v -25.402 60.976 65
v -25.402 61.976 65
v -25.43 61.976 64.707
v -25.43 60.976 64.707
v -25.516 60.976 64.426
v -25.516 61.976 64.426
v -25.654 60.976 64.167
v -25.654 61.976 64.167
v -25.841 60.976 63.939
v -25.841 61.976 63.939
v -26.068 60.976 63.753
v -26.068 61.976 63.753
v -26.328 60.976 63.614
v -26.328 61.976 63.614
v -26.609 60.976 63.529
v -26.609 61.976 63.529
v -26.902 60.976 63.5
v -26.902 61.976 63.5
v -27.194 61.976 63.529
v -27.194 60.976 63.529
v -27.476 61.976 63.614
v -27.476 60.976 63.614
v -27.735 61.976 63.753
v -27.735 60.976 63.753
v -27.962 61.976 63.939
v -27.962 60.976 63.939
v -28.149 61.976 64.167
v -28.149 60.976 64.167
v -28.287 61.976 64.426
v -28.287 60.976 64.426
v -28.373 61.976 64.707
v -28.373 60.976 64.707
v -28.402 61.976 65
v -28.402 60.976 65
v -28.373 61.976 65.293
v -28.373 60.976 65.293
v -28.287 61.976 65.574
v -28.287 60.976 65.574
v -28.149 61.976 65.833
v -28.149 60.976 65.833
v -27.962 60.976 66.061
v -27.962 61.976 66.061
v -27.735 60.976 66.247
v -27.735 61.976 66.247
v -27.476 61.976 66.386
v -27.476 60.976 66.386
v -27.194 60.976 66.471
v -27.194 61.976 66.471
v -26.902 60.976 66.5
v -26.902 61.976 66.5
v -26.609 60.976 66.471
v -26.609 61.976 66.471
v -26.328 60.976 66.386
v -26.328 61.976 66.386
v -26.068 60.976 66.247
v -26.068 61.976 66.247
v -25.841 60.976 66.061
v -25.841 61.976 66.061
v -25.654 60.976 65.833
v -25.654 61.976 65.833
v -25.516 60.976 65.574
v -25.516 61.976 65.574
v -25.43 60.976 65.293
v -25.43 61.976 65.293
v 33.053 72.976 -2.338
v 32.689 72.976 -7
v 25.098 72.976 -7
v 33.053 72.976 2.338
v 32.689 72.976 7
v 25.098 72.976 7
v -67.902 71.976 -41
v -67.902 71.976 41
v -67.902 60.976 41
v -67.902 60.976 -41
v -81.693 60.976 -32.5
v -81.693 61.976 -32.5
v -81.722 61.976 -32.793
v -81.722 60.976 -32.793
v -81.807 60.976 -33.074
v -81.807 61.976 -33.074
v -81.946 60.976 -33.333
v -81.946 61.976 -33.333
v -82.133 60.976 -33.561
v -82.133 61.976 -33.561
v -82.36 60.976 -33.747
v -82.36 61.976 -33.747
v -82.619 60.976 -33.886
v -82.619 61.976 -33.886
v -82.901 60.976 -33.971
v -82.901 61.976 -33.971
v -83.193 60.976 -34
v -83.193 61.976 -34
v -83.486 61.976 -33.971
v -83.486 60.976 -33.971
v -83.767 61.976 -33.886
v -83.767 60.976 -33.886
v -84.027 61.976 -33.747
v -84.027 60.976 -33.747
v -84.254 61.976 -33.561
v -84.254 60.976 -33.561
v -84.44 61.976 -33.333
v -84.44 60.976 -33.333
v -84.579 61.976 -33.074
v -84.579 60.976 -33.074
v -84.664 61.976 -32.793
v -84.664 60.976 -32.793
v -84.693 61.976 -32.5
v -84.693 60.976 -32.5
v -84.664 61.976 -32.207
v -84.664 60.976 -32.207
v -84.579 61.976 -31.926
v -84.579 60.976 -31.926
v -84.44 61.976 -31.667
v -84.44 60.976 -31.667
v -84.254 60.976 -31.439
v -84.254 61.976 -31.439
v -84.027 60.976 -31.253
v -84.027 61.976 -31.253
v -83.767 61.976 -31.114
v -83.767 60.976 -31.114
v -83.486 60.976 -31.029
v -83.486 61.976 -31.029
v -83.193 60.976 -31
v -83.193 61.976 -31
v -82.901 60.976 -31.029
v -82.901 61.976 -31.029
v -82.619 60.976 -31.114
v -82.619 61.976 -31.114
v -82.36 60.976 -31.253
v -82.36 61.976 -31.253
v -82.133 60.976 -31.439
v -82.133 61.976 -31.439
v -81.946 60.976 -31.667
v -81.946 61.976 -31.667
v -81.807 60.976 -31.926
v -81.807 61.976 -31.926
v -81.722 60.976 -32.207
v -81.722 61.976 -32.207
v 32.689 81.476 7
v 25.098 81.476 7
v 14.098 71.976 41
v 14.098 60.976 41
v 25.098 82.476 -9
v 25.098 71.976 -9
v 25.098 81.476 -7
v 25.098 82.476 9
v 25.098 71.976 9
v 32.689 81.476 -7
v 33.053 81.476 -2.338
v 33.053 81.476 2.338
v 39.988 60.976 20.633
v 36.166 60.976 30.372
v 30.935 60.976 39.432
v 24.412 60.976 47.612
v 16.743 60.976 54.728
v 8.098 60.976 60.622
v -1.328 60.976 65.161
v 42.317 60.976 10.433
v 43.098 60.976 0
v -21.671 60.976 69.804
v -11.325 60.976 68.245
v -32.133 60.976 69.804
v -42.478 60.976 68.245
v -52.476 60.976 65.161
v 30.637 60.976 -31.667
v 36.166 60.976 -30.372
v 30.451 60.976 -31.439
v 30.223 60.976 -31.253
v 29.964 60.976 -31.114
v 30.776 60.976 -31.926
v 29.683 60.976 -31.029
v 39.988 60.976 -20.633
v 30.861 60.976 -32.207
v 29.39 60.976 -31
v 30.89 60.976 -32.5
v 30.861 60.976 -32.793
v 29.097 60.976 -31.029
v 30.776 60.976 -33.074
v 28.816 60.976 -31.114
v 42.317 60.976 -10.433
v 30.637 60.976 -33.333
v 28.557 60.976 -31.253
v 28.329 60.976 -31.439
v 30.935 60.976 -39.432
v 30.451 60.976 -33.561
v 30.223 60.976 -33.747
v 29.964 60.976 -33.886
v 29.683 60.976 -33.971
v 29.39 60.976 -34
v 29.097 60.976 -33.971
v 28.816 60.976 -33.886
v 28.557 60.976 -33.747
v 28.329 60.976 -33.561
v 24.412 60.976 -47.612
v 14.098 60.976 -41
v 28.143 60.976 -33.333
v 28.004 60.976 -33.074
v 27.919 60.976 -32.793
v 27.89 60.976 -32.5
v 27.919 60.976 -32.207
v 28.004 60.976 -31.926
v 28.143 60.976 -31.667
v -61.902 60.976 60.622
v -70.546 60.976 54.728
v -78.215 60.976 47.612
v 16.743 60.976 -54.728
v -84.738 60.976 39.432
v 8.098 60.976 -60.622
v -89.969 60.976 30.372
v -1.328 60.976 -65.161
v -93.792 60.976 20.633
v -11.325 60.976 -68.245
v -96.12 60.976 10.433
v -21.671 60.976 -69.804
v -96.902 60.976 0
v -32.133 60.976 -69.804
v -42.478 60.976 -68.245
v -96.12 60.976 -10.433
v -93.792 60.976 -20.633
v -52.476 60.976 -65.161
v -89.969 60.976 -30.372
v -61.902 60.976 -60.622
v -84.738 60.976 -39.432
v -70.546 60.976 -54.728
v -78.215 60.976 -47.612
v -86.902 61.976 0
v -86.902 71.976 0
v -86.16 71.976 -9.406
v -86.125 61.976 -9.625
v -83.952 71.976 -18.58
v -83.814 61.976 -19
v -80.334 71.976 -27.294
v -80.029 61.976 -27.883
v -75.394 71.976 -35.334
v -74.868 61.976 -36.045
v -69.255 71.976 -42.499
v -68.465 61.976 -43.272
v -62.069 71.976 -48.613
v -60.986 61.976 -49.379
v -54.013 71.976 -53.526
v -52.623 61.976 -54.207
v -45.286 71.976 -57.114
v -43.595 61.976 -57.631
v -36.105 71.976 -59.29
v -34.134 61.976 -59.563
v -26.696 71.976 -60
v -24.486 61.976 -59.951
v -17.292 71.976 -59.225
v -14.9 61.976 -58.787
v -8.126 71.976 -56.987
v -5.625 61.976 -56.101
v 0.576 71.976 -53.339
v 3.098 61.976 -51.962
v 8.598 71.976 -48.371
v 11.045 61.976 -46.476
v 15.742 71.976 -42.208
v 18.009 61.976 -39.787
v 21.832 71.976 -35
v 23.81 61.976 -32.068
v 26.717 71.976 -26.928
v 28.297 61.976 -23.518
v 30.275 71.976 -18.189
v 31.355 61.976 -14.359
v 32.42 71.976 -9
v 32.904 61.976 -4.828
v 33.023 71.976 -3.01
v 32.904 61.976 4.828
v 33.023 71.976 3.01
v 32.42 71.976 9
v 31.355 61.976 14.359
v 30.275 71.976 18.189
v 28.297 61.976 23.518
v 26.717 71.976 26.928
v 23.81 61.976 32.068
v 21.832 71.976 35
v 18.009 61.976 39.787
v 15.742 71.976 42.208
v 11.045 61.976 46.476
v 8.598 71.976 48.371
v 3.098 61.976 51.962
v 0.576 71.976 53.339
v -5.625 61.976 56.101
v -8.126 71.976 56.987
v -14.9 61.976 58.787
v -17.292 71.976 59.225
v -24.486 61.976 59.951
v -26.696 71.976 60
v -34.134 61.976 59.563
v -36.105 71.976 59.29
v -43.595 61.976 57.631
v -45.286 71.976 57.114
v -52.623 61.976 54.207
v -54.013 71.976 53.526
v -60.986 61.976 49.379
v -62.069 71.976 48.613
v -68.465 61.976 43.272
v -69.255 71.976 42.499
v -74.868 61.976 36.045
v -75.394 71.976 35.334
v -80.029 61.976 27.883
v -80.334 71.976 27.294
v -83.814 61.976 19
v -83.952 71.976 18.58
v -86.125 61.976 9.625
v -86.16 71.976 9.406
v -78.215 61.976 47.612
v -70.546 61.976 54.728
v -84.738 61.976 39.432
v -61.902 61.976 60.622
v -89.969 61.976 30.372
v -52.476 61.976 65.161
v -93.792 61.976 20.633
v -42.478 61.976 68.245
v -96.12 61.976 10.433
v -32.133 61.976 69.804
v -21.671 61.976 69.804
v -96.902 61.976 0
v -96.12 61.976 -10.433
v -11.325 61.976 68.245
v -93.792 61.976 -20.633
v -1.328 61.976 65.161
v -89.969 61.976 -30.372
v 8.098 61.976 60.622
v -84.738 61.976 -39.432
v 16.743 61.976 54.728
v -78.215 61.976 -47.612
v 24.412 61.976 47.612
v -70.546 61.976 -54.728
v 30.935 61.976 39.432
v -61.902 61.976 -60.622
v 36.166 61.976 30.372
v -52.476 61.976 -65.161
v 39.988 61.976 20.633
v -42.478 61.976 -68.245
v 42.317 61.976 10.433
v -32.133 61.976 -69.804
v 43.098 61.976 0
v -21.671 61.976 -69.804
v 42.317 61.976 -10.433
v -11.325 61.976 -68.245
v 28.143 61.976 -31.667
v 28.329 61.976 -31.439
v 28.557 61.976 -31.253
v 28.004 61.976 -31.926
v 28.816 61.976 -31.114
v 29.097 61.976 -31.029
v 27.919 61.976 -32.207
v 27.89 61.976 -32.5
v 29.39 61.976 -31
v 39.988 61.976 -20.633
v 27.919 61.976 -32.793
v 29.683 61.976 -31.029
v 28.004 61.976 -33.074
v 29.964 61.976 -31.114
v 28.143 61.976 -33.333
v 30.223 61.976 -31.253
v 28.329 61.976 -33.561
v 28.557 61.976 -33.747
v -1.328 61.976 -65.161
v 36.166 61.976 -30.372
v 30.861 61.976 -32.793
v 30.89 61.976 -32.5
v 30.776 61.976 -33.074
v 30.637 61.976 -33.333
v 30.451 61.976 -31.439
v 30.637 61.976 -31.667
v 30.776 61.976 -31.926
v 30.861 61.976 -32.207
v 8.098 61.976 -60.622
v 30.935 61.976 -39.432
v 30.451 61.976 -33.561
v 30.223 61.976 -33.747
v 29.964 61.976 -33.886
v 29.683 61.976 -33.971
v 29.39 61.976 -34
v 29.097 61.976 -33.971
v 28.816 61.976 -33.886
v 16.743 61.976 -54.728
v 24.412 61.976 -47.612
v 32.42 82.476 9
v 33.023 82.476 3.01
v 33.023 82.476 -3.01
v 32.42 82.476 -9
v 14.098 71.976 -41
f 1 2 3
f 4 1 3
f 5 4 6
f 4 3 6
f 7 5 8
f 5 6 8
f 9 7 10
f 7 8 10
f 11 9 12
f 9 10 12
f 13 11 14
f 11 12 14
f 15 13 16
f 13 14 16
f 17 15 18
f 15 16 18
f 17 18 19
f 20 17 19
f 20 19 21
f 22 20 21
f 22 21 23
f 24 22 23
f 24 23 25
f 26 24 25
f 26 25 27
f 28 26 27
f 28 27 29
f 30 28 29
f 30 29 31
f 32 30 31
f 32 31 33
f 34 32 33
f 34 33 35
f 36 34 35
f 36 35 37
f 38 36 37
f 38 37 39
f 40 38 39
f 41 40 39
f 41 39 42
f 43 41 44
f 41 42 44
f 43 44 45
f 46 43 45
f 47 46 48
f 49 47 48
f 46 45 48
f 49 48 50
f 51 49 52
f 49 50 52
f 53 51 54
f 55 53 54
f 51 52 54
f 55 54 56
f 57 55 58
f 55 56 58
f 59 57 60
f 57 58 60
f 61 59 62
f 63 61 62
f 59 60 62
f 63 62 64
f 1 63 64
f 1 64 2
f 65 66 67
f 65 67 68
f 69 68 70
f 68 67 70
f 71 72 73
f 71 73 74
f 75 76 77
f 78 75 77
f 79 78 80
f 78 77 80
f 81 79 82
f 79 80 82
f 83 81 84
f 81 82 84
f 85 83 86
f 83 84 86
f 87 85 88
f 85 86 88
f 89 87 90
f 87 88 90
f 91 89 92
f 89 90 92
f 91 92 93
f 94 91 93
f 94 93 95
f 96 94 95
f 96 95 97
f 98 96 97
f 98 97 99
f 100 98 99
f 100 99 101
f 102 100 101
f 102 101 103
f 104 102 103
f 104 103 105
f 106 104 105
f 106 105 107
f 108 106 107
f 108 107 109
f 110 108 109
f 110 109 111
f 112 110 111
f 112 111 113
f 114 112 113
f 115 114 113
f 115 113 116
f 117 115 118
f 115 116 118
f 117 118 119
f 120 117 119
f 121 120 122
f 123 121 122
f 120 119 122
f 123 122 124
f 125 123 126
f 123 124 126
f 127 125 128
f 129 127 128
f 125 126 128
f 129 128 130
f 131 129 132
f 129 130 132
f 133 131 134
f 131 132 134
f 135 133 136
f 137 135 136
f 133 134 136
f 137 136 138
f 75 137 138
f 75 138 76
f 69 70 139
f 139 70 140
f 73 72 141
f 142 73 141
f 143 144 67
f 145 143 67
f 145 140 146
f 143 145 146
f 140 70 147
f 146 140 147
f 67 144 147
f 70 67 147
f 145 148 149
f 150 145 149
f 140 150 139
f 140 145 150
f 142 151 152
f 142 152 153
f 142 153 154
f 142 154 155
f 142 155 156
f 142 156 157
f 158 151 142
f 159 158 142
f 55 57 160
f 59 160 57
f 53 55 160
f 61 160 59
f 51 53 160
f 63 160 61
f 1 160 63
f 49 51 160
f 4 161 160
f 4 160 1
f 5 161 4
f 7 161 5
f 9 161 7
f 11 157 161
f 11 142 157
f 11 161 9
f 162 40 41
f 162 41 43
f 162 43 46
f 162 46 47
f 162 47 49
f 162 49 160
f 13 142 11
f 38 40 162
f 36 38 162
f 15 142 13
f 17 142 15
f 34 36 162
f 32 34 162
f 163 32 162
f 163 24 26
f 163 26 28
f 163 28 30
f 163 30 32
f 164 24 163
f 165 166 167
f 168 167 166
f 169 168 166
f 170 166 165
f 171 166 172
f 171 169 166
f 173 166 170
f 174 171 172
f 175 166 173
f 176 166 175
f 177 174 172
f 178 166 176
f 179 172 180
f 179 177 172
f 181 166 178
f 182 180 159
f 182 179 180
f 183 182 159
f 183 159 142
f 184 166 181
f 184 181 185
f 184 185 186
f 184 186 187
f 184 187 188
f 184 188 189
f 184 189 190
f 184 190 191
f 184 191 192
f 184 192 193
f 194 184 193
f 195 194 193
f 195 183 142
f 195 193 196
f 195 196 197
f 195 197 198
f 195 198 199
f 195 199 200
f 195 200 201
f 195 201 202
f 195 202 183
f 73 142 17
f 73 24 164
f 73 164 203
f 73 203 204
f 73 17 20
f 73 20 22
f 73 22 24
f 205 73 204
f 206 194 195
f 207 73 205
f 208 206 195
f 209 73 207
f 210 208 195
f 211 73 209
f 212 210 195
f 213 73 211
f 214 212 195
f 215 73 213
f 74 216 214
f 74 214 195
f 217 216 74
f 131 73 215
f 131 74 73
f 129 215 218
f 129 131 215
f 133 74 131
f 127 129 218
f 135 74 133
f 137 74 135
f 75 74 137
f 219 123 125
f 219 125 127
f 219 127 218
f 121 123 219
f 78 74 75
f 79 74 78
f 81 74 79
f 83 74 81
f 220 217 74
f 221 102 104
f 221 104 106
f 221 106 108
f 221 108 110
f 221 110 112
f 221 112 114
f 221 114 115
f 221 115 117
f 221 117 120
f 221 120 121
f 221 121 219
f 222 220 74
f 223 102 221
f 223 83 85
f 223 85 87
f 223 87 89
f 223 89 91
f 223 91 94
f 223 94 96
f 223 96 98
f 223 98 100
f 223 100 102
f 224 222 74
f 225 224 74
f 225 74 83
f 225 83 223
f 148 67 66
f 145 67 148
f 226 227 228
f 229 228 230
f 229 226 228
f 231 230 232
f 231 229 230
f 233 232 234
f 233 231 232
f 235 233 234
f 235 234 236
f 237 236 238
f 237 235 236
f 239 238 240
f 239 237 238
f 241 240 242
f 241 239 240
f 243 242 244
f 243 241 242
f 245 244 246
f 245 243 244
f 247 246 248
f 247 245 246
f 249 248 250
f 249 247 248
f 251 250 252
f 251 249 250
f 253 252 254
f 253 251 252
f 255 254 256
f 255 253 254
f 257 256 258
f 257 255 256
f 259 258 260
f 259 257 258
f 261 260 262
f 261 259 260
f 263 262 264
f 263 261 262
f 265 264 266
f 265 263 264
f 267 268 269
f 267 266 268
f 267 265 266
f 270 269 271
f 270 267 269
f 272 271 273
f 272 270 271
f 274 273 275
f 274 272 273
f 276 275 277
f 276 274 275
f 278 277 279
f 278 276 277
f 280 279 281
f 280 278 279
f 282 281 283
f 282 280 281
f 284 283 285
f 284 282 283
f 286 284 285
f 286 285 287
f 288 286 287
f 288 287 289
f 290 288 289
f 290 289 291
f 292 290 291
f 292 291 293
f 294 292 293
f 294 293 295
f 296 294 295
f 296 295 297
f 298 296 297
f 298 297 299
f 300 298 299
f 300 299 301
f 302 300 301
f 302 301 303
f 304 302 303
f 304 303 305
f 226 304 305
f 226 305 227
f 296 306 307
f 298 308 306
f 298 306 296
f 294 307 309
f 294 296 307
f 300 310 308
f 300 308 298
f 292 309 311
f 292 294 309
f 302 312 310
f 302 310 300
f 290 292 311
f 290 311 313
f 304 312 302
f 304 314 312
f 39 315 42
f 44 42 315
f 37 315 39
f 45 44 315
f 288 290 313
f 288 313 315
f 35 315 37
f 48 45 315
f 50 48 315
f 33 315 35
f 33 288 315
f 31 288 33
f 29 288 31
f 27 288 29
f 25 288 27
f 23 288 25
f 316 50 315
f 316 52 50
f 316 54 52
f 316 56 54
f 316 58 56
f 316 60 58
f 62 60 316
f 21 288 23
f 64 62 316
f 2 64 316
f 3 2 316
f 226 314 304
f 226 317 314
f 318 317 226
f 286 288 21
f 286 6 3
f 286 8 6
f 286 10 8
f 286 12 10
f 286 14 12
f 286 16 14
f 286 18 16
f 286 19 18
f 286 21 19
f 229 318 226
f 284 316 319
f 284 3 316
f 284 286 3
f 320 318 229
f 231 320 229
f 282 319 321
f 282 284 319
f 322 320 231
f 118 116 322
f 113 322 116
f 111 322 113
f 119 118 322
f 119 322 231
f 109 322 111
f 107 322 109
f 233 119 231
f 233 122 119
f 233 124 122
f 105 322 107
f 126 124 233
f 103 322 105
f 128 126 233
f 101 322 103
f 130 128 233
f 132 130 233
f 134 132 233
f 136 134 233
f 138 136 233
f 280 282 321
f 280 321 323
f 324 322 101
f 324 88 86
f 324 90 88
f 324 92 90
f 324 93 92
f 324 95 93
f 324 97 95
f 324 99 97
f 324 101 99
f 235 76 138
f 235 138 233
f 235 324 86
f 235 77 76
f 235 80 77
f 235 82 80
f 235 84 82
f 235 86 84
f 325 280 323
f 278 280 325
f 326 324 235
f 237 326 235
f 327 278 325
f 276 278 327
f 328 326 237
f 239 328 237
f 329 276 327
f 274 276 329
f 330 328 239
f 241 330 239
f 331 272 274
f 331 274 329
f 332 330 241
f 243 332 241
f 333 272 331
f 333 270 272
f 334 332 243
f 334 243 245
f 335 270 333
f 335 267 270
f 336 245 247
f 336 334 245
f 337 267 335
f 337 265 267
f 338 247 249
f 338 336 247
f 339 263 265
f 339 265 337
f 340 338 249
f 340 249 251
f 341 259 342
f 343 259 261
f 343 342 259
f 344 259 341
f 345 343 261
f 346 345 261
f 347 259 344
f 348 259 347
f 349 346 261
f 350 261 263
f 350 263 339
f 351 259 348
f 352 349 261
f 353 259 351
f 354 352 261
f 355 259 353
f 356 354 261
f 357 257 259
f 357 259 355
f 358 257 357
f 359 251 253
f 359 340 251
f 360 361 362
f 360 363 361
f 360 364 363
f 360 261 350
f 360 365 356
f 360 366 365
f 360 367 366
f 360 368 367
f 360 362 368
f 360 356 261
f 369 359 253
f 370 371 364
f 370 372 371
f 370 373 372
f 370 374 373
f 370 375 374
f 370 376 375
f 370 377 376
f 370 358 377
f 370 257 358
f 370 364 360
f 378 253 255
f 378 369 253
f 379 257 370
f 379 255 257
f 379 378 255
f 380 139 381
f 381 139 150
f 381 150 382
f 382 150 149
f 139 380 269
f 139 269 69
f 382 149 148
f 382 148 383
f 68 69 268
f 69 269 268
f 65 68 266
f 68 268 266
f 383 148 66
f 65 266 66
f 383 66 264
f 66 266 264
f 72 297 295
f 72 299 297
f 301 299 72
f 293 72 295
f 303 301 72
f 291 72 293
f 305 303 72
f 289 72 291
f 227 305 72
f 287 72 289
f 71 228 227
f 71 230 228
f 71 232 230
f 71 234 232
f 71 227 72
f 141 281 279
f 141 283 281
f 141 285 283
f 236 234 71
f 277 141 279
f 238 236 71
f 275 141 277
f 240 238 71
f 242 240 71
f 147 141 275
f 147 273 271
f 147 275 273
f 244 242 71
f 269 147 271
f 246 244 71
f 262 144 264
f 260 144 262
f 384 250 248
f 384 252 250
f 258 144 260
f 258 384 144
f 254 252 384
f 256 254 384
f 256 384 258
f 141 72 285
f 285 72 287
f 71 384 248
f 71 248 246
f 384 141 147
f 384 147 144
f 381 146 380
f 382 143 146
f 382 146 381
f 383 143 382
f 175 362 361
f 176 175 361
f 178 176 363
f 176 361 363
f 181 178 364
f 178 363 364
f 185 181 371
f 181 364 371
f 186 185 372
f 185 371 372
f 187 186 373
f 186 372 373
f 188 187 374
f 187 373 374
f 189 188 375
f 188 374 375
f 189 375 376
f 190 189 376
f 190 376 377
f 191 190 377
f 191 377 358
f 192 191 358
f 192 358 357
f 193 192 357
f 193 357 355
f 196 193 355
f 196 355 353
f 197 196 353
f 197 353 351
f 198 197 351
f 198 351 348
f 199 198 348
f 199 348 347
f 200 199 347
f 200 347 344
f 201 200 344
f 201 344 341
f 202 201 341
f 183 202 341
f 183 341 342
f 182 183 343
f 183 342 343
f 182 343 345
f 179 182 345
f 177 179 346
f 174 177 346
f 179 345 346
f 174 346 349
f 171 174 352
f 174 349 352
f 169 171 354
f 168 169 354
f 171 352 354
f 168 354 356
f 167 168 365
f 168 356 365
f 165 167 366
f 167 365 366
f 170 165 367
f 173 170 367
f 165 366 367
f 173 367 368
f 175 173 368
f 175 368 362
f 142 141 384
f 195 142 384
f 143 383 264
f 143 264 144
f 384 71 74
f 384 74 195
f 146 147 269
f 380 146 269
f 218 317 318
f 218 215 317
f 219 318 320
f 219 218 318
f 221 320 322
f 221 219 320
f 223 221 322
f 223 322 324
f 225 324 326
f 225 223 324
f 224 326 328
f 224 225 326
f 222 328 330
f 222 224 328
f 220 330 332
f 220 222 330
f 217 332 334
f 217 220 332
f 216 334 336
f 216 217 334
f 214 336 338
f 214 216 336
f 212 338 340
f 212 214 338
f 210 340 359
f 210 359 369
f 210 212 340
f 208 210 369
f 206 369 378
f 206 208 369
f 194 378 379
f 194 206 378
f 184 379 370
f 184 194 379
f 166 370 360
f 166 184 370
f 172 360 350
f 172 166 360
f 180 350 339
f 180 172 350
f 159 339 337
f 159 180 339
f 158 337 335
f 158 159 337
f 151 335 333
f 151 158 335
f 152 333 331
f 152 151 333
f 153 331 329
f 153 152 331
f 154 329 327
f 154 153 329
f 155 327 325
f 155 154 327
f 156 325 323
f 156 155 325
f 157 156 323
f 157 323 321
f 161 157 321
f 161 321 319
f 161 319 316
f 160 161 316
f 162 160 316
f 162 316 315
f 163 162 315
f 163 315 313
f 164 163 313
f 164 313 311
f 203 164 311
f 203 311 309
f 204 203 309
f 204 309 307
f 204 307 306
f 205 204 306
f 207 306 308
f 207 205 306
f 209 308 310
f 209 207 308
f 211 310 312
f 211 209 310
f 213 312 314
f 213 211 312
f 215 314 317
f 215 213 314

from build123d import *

# Parameters (mm, degrees)
CROQUIS2_W              = 82
CROQUIS2_H              = 82
CORTAR_EXTRUIR1_DEPTH   = 11.5
SALIENTE_EXTRUIR1_DEPTH = 10.5
CROQUIS4_W              = 14
CROQUIS4_H              = 8.5
CORTAR_EXTRUIR2_DEPTH   = 10.5
CROQUIS5_R              = 1.5
CORTAR_EXTRUIR3_DEPTH   = 10


with BuildPart() as part:
    # Croquis1 → Revolución1 (revolve)
    with BuildSketch(Plane.XY):
        Polygon((-96.901642817, 61.97611702), (-96.901642817, 60.97611702), (-67.901642817, 60.97611702), (-67.901642817, 61.97611702), (-67.901642817, 71.97611702), (-86.901642817, 71.97611702), (-86.901642817, 61.97611702), align=None)
    revolve(axis=Axis((-26.901642817, 46.97611702, 0), (0, -1, 0)))

    # Croquis2 → Cortar-Extruir1 (cut)
    with BuildSketch(Plane(origin=(0, 71.97611702, 0), x_dir=(1, 0, 0), z_dir=(0, 1, 0))):
        with Locations((-26.901642817, 0)):
            Rectangle(CROQUIS2_W, CROQUIS2_H)
    extrude(amount=-CORTAR_EXTRUIR1_DEPTH, mode=Mode.SUBTRACT)

    # Croquis3 → Saliente-Extruir1 (add)
    with BuildSketch(Plane(origin=(0, 71.97611702, 0), x_dir=(1, 0, 0), z_dir=(0, 1, 0))):
        with BuildLine():
            Line((32.419516983, 9), (25.098357183, 9))
            Line((25.098357183, 9), (25.098357183, -9))
            Line((25.098357183, -9), (32.419516983, -9))
            ThreePointArc((32.419516983, -9), (33.098357183, 0), (32.419516983, 9))
        make_face()
    extrude(amount=SALIENTE_EXTRUIR1_DEPTH)

    # Croquis4 → Cortar-Extruir2 (cut)
    with BuildSketch(Plane.ZY.offset(-25.098357183)):
        with Locations((0, 77.22611702)):
            Rectangle(CROQUIS4_W, CROQUIS4_H)
    extrude(amount=-CORTAR_EXTRUIR2_DEPTH, mode=Mode.SUBTRACT)

    # Croquis5 → Cortar-Extruir3 (cut)
    with BuildSketch(Plane(origin=(0, 61.97611702, 0), x_dir=(1, 0, 0), z_dir=(0, 1, 0))):
        with Locations((-26.901642817, -65)):
            Circle(CROQUIS5_R)
        with Locations((-83.193294063, 32.5)):
            Circle(CROQUIS5_R)
        with Locations((29.390008429, 32.5)):
            Circle(CROQUIS5_R)
    extrude(amount=-CORTAR_EXTRUIR3_DEPTH, mode=Mode.SUBTRACT)


solid = part.part
